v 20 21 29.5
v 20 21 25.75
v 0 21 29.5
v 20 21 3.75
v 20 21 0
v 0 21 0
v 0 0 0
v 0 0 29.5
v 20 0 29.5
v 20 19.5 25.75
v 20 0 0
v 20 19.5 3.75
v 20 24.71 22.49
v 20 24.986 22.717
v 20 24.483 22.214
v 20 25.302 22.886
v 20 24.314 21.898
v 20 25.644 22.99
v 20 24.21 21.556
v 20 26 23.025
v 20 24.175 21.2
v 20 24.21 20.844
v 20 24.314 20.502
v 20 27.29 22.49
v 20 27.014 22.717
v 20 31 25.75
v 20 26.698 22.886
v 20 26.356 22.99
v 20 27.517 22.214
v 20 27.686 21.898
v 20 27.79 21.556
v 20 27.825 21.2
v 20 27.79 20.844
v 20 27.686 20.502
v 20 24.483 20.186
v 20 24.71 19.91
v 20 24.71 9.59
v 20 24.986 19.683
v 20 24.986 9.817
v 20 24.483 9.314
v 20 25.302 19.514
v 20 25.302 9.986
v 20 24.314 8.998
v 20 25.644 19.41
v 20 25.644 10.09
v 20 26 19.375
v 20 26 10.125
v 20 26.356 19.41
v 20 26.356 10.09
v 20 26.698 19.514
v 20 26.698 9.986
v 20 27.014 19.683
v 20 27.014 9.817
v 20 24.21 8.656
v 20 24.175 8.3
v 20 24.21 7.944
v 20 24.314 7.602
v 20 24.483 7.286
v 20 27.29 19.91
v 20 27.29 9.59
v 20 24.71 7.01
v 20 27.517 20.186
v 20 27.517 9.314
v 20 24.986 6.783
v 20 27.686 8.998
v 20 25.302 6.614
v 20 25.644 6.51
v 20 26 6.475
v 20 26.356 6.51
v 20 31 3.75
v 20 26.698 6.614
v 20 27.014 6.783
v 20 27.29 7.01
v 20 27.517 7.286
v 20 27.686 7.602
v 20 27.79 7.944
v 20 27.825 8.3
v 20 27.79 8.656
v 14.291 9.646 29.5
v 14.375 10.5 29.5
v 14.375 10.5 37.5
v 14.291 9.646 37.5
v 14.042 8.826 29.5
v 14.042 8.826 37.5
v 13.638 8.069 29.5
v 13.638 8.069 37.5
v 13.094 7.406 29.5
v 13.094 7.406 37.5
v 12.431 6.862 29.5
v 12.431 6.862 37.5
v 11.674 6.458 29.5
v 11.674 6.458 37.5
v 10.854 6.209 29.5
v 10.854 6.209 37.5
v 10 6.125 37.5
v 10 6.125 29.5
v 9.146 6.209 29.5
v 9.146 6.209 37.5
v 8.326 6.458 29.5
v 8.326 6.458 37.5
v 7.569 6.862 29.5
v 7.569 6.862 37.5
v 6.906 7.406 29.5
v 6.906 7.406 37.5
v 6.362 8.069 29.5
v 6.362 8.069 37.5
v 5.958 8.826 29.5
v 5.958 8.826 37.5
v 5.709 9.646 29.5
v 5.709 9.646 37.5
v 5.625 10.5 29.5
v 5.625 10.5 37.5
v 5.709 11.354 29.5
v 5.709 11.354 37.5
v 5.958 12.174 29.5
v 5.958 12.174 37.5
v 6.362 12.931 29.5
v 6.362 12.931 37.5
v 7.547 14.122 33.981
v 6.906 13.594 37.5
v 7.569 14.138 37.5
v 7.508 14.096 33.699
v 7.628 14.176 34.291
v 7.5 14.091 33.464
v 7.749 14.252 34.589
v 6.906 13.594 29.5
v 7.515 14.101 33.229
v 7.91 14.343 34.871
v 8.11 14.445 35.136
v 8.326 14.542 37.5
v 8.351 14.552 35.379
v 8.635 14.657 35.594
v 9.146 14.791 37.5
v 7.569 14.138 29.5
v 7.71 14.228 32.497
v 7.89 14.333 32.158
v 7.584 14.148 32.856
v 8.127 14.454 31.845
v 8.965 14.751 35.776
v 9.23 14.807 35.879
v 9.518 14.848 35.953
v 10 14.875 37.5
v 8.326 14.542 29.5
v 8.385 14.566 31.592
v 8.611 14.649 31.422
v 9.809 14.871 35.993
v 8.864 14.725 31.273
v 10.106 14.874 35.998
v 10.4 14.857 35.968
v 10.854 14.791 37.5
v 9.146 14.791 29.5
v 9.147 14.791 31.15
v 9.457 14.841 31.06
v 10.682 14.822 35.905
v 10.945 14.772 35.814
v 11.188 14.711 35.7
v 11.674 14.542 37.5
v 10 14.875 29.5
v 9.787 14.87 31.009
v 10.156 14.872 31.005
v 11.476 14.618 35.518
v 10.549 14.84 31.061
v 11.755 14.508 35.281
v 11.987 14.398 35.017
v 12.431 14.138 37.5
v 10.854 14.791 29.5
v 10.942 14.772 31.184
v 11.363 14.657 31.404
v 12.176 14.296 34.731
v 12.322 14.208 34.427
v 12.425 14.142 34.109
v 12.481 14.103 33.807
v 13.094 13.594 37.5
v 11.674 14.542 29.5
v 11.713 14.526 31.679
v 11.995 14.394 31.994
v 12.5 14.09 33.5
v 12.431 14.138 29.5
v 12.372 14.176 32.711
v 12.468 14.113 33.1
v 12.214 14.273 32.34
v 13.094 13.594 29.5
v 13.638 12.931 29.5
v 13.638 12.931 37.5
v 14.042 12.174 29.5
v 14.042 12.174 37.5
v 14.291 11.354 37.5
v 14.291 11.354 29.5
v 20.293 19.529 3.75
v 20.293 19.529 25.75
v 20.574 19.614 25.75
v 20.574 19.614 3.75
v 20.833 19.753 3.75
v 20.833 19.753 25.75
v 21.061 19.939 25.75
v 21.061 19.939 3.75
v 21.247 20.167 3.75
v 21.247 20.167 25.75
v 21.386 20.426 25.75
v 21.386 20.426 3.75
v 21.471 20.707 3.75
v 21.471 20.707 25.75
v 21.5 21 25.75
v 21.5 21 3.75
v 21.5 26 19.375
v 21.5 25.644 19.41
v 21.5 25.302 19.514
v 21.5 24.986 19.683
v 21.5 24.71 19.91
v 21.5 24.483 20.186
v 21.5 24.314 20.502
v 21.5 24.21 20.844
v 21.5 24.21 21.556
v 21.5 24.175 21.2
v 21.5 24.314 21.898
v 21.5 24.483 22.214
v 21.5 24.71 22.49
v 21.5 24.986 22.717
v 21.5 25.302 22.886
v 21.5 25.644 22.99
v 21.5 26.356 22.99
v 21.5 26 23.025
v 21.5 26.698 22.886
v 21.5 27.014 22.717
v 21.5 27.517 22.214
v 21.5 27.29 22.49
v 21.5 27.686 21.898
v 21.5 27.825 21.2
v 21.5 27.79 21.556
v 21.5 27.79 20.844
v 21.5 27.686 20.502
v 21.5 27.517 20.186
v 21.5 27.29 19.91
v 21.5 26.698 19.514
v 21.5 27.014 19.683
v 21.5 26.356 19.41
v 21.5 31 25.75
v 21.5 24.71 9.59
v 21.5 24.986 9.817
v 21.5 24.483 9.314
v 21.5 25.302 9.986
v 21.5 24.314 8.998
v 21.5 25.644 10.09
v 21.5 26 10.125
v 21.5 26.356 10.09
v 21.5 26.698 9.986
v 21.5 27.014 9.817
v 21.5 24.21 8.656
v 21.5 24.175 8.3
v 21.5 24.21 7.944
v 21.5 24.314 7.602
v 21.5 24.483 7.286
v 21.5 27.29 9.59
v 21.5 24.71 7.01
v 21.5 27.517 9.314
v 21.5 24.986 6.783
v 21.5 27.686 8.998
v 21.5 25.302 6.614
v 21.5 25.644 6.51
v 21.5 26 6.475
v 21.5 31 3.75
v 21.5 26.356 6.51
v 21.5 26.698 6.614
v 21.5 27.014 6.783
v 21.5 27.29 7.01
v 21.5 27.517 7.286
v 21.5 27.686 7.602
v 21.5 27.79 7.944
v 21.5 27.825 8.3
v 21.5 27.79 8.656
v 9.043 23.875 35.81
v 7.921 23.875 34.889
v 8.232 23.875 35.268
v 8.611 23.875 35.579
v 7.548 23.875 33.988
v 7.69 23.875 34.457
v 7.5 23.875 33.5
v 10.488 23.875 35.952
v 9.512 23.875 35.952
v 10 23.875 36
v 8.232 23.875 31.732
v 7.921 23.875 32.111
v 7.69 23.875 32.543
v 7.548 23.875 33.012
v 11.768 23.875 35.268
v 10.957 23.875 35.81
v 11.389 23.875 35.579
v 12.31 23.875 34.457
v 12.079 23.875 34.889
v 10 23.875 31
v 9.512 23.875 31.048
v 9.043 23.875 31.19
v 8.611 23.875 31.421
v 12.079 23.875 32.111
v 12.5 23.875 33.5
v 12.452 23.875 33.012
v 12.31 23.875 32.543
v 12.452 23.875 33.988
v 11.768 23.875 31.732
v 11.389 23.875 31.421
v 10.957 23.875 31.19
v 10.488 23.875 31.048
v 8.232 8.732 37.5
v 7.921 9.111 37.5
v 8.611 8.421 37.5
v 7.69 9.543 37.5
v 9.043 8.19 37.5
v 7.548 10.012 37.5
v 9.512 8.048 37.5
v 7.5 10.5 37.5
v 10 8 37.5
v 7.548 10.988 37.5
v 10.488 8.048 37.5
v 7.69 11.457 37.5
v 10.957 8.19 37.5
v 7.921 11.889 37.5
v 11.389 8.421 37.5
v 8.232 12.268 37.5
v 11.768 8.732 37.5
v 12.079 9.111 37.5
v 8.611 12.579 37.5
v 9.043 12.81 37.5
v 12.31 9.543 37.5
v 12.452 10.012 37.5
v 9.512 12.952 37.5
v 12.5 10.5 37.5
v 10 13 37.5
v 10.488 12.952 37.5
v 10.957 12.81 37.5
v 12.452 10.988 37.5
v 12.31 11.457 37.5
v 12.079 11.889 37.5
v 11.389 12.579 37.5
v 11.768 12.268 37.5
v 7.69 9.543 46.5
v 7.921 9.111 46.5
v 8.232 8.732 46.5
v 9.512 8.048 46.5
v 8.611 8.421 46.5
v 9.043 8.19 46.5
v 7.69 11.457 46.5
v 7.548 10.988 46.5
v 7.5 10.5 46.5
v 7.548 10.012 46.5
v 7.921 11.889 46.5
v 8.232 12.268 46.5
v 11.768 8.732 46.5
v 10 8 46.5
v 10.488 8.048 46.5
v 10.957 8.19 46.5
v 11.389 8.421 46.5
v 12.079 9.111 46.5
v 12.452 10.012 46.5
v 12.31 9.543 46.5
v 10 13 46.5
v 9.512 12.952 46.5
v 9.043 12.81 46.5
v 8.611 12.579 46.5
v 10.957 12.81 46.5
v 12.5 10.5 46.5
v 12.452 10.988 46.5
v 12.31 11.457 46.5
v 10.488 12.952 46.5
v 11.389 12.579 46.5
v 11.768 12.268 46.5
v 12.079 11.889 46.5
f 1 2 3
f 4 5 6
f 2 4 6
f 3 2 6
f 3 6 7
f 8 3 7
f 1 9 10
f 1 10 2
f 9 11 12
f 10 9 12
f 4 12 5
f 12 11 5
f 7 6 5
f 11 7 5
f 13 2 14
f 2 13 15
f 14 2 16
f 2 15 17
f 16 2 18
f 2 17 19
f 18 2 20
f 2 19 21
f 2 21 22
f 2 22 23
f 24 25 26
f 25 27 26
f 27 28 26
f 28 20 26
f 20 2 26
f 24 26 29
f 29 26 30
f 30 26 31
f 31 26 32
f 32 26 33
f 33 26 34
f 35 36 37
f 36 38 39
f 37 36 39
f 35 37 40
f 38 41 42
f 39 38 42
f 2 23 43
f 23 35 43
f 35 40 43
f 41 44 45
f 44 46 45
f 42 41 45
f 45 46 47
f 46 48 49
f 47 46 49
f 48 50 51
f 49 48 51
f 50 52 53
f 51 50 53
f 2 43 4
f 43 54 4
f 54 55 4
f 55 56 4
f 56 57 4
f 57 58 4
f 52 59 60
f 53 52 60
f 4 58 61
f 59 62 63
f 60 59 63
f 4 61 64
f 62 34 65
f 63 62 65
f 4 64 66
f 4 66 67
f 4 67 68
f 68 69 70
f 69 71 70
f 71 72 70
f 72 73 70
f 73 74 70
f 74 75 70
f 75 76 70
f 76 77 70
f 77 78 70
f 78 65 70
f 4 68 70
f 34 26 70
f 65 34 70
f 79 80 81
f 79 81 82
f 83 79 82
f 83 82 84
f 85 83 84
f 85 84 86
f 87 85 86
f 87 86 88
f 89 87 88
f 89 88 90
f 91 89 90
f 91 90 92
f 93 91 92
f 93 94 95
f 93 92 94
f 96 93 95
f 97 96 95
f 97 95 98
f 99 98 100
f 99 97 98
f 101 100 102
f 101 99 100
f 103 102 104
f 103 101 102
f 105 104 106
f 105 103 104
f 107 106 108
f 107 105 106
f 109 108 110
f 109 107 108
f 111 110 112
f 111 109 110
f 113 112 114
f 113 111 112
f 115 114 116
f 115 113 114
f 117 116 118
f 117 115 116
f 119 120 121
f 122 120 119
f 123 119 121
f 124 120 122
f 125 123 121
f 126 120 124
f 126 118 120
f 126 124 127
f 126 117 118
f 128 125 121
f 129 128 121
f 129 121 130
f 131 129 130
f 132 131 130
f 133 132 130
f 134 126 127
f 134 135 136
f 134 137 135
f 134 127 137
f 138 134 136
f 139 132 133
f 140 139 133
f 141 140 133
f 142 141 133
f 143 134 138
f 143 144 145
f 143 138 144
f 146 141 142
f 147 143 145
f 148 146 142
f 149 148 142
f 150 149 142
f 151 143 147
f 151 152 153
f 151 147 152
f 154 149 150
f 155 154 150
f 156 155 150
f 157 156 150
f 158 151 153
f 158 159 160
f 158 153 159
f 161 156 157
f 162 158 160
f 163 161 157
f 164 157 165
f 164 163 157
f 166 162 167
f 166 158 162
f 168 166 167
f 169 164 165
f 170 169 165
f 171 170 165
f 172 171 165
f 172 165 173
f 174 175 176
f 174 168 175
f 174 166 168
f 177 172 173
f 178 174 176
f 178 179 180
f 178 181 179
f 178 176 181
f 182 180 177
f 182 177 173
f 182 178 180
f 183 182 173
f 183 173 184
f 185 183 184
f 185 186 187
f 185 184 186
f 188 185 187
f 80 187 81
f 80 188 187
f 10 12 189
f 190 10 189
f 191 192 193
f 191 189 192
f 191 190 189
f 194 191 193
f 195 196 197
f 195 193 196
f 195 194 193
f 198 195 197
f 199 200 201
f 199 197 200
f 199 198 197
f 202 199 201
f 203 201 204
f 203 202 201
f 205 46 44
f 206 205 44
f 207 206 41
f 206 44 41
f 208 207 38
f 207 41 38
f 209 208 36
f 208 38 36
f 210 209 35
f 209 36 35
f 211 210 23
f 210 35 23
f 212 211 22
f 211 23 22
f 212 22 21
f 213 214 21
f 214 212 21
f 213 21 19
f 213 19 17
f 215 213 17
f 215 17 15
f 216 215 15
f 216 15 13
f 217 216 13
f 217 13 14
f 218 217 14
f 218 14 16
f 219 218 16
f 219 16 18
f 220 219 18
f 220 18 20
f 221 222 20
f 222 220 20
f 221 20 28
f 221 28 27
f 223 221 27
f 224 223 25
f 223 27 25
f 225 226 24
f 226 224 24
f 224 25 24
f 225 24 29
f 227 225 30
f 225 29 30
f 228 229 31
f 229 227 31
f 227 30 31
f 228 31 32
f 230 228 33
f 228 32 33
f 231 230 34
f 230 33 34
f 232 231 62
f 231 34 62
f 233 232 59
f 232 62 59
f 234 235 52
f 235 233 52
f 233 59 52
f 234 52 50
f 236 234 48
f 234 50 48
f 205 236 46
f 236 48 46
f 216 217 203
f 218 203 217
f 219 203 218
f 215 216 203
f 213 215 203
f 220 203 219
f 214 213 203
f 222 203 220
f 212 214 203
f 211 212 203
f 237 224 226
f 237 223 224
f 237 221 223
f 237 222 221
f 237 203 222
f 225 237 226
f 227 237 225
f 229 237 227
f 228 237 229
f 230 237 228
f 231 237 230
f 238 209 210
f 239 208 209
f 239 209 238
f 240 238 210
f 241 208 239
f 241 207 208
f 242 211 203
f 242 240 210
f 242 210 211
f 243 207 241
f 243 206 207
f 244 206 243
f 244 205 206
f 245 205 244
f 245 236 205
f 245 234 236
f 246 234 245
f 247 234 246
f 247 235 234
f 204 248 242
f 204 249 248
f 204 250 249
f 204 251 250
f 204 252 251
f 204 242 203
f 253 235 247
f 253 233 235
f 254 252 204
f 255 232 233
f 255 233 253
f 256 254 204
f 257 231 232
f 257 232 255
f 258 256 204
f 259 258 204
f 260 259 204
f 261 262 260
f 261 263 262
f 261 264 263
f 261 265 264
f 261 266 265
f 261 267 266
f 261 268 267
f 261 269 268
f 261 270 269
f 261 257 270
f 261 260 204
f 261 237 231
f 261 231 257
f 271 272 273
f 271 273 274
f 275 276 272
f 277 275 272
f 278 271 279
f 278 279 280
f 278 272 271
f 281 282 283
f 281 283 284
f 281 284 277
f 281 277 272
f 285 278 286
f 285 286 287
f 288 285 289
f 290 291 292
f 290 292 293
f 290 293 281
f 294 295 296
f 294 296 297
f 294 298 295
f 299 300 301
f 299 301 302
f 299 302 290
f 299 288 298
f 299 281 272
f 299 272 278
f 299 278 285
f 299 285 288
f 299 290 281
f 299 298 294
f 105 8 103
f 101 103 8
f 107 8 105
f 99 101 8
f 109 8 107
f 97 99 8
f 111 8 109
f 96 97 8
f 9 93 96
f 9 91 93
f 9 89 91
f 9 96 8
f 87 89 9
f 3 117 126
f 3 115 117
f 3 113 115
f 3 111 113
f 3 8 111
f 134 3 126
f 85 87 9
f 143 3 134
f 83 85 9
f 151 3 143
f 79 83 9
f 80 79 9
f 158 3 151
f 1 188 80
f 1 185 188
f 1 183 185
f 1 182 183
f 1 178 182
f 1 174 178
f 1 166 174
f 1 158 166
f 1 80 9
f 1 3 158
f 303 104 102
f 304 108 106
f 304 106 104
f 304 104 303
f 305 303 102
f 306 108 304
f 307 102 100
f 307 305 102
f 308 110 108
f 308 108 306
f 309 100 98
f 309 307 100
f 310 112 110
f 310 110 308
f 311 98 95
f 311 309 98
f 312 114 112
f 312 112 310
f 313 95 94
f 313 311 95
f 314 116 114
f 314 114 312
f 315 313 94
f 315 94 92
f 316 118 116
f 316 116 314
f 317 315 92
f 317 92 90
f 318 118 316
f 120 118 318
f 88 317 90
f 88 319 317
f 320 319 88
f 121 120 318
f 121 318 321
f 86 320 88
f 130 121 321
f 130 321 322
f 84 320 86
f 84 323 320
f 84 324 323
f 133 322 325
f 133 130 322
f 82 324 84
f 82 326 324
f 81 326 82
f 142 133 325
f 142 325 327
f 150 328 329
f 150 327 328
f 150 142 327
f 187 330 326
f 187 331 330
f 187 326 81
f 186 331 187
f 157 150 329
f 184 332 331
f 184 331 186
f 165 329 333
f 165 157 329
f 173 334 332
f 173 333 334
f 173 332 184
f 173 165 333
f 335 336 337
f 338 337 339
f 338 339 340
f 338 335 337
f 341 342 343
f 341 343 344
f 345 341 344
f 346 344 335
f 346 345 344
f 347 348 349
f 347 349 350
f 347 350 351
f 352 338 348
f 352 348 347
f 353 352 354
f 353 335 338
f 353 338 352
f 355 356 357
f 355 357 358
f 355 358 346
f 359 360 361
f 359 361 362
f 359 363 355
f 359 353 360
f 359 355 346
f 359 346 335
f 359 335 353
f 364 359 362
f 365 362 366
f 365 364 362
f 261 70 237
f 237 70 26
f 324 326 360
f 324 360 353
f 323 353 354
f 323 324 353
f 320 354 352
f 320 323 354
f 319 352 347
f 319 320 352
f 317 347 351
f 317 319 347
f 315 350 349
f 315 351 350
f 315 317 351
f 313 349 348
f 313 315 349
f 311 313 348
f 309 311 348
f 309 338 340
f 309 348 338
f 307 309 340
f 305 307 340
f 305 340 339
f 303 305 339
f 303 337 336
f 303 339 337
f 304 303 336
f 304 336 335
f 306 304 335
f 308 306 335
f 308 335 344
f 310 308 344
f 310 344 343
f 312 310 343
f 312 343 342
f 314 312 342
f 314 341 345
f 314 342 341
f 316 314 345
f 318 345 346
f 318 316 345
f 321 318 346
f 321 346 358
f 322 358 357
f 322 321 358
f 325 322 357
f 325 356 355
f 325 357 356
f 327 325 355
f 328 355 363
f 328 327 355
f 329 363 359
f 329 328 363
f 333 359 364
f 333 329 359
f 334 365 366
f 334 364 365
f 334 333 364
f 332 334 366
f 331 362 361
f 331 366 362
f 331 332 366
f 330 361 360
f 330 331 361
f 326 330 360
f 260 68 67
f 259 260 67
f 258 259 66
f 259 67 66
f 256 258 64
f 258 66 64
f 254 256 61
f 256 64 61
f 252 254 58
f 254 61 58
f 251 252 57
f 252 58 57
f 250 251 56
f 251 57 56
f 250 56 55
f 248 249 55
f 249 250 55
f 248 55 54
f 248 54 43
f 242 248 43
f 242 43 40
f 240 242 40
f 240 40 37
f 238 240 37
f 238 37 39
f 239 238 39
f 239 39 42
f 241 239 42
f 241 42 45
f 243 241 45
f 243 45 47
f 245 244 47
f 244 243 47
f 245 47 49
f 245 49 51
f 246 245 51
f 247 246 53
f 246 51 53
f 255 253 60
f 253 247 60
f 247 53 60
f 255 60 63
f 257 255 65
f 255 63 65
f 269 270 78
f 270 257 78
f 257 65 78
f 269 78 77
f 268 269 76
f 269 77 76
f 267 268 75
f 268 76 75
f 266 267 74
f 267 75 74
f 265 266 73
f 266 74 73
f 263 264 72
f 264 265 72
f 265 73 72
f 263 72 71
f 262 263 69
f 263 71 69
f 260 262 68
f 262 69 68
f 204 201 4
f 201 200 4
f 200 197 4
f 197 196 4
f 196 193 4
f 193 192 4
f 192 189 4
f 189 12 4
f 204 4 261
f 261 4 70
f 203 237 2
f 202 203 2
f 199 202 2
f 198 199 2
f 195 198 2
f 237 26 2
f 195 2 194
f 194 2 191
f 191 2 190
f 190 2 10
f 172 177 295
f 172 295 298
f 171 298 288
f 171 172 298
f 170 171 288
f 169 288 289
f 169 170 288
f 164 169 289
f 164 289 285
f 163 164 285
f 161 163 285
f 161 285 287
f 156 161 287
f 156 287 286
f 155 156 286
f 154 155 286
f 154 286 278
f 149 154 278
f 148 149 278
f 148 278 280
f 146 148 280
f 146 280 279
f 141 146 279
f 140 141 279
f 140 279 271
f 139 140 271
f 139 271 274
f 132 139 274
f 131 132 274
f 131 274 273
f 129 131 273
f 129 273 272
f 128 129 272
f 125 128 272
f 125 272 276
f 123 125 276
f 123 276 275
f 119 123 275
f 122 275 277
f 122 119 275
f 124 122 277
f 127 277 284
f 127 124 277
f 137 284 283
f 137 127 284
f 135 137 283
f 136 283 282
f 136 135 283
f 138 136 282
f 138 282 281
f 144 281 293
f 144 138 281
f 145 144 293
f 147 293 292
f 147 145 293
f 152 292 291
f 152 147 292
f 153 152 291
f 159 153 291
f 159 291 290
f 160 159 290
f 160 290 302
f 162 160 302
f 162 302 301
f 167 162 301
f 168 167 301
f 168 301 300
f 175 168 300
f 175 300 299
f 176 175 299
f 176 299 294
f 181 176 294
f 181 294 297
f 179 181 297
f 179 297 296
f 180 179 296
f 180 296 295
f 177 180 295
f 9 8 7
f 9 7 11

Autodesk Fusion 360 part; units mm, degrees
sketch "Sketch1" plane through (0, 0, 0) normal (0, 0, 1) x (1, 0, 0)
  line L0 (0, 0) -> (20, 0)
  line L1 (20, 0) -> (20, 21)
  line L2 (20, 21) -> (0, 21)
  line L3 (0, 21) -> (0, 0)
  dimension "d1" = 20
  dimension "d2" = 21
extrude "Extrude1" add sketch "Sketch1" along normal blind 29.5 makes body 1
sketch "Sketch2" plane through (20, 0, 0) normal (1, 0, 0) x (0, 0, -1)
  line L0 (0, 0) -> (0, 21)
  line L1 (0, 21) -> (-29.5, 21)
  line L2 (-29.5, 21) -> (-29.5, 0)
  line L3 (-29.5, 0) -> (0, 0)
  line L4 (-25.75, 21) -> (-3.75, 21)
  line L5 (-3.75, 21) -> (-3.75, 31)
  line L6 (-3.75, 31) -> (-25.75, 31)
  line L7 (-25.75, 31) -> (-25.75, 21)
  line L8 (0, 0) -> (0, 21)
  line L9 (0, 0) -> (-29.5, 0)
  circle A0 centre (-21.2, 26) radius 1.825
  circle A1 centre (-8.3, 26) radius 1.825
  line L10 (-8.3, 26) -> (-21.2, 26) construction
  point P0 (-14.75, 0)
  point P1 (-14.75, 31)
  point P2 (-14.75, 26)
  point P3 (-3.75, 26)
  dimension "d5" = 22
  dimension "d6" = 10
  dimension "d7" = 3.65
  dimension "d8" = 3.65
  dimension "d9" = 12.9
extrude "Extrude2" add sketch "Sketch2" along normal blind 1.5 separate body contours L1 L4 L5 L6 L7 makes body 2
extrude "Extrude3" add 1 faces at (20.5, 21, 11.0833) along direction (0, -1, 0) blind 1.5 on bodies 2 bodies 2 1
fillet "Fillet1" radius 1.5 1 edges at (21.5, 19.5, 14.75) on bodies 2
sketch "Sketch3" plane through (0, 0, 29.5) normal (0, 0, 1) x (1, 0, 0)
  line L0 (0, 21) -> (0, 0)
  line L1 (0, 0) -> (20, 0)
  line L2 (20, 0) -> (20, 21)
  line L3 (20, 21) -> (0, 21)
  circle A0 centre (10, 10.5) radius 4.375
  point P0 (20, 10.5)
  point P1 (10, 0)
  dimension "d15" = 8.75
extrude "Extrude4" add sketch "Sketch3" along normal blind 8 contours A0 bodies 2
sketch "Sketch4" plane through (0, 0, 37.5) normal (0, 0, 1) x (1, 0, 0)
  circle A0 centre (10, 10.5) radius 4.375
  circle A1 centre (10, 10.5) radius 2.5
  dimension "d18" = 5
extrude "Extrude5" add sketch "Sketch4" along normal blind 9 contours A1 bodies 2
ref_plane "WorkPlane1" through (10, 10.5, 14.75) normal (0, 1, 0) x (-1, 0, 0)
sketch "Sketch5" plane through (10, 10.5, 14.75) normal (0, 1, 0) x (1, 0, 0)
  line L0 (-4.375, -22.75) -> (4.375, -22.75)
  circle A0 centre (0, -18.75) radius 2.5
  point P0 (0, -22.75)
  dimension "d21" = 5
  dimension "d22" = 4
extrude "Extrude6" add sketch "Sketch5" along normal blind 13.375 bodies 2
equation "d8 = d7"
equation "d23 = ( 8.75 / 2 ) * 1 mm + 9 mm"
